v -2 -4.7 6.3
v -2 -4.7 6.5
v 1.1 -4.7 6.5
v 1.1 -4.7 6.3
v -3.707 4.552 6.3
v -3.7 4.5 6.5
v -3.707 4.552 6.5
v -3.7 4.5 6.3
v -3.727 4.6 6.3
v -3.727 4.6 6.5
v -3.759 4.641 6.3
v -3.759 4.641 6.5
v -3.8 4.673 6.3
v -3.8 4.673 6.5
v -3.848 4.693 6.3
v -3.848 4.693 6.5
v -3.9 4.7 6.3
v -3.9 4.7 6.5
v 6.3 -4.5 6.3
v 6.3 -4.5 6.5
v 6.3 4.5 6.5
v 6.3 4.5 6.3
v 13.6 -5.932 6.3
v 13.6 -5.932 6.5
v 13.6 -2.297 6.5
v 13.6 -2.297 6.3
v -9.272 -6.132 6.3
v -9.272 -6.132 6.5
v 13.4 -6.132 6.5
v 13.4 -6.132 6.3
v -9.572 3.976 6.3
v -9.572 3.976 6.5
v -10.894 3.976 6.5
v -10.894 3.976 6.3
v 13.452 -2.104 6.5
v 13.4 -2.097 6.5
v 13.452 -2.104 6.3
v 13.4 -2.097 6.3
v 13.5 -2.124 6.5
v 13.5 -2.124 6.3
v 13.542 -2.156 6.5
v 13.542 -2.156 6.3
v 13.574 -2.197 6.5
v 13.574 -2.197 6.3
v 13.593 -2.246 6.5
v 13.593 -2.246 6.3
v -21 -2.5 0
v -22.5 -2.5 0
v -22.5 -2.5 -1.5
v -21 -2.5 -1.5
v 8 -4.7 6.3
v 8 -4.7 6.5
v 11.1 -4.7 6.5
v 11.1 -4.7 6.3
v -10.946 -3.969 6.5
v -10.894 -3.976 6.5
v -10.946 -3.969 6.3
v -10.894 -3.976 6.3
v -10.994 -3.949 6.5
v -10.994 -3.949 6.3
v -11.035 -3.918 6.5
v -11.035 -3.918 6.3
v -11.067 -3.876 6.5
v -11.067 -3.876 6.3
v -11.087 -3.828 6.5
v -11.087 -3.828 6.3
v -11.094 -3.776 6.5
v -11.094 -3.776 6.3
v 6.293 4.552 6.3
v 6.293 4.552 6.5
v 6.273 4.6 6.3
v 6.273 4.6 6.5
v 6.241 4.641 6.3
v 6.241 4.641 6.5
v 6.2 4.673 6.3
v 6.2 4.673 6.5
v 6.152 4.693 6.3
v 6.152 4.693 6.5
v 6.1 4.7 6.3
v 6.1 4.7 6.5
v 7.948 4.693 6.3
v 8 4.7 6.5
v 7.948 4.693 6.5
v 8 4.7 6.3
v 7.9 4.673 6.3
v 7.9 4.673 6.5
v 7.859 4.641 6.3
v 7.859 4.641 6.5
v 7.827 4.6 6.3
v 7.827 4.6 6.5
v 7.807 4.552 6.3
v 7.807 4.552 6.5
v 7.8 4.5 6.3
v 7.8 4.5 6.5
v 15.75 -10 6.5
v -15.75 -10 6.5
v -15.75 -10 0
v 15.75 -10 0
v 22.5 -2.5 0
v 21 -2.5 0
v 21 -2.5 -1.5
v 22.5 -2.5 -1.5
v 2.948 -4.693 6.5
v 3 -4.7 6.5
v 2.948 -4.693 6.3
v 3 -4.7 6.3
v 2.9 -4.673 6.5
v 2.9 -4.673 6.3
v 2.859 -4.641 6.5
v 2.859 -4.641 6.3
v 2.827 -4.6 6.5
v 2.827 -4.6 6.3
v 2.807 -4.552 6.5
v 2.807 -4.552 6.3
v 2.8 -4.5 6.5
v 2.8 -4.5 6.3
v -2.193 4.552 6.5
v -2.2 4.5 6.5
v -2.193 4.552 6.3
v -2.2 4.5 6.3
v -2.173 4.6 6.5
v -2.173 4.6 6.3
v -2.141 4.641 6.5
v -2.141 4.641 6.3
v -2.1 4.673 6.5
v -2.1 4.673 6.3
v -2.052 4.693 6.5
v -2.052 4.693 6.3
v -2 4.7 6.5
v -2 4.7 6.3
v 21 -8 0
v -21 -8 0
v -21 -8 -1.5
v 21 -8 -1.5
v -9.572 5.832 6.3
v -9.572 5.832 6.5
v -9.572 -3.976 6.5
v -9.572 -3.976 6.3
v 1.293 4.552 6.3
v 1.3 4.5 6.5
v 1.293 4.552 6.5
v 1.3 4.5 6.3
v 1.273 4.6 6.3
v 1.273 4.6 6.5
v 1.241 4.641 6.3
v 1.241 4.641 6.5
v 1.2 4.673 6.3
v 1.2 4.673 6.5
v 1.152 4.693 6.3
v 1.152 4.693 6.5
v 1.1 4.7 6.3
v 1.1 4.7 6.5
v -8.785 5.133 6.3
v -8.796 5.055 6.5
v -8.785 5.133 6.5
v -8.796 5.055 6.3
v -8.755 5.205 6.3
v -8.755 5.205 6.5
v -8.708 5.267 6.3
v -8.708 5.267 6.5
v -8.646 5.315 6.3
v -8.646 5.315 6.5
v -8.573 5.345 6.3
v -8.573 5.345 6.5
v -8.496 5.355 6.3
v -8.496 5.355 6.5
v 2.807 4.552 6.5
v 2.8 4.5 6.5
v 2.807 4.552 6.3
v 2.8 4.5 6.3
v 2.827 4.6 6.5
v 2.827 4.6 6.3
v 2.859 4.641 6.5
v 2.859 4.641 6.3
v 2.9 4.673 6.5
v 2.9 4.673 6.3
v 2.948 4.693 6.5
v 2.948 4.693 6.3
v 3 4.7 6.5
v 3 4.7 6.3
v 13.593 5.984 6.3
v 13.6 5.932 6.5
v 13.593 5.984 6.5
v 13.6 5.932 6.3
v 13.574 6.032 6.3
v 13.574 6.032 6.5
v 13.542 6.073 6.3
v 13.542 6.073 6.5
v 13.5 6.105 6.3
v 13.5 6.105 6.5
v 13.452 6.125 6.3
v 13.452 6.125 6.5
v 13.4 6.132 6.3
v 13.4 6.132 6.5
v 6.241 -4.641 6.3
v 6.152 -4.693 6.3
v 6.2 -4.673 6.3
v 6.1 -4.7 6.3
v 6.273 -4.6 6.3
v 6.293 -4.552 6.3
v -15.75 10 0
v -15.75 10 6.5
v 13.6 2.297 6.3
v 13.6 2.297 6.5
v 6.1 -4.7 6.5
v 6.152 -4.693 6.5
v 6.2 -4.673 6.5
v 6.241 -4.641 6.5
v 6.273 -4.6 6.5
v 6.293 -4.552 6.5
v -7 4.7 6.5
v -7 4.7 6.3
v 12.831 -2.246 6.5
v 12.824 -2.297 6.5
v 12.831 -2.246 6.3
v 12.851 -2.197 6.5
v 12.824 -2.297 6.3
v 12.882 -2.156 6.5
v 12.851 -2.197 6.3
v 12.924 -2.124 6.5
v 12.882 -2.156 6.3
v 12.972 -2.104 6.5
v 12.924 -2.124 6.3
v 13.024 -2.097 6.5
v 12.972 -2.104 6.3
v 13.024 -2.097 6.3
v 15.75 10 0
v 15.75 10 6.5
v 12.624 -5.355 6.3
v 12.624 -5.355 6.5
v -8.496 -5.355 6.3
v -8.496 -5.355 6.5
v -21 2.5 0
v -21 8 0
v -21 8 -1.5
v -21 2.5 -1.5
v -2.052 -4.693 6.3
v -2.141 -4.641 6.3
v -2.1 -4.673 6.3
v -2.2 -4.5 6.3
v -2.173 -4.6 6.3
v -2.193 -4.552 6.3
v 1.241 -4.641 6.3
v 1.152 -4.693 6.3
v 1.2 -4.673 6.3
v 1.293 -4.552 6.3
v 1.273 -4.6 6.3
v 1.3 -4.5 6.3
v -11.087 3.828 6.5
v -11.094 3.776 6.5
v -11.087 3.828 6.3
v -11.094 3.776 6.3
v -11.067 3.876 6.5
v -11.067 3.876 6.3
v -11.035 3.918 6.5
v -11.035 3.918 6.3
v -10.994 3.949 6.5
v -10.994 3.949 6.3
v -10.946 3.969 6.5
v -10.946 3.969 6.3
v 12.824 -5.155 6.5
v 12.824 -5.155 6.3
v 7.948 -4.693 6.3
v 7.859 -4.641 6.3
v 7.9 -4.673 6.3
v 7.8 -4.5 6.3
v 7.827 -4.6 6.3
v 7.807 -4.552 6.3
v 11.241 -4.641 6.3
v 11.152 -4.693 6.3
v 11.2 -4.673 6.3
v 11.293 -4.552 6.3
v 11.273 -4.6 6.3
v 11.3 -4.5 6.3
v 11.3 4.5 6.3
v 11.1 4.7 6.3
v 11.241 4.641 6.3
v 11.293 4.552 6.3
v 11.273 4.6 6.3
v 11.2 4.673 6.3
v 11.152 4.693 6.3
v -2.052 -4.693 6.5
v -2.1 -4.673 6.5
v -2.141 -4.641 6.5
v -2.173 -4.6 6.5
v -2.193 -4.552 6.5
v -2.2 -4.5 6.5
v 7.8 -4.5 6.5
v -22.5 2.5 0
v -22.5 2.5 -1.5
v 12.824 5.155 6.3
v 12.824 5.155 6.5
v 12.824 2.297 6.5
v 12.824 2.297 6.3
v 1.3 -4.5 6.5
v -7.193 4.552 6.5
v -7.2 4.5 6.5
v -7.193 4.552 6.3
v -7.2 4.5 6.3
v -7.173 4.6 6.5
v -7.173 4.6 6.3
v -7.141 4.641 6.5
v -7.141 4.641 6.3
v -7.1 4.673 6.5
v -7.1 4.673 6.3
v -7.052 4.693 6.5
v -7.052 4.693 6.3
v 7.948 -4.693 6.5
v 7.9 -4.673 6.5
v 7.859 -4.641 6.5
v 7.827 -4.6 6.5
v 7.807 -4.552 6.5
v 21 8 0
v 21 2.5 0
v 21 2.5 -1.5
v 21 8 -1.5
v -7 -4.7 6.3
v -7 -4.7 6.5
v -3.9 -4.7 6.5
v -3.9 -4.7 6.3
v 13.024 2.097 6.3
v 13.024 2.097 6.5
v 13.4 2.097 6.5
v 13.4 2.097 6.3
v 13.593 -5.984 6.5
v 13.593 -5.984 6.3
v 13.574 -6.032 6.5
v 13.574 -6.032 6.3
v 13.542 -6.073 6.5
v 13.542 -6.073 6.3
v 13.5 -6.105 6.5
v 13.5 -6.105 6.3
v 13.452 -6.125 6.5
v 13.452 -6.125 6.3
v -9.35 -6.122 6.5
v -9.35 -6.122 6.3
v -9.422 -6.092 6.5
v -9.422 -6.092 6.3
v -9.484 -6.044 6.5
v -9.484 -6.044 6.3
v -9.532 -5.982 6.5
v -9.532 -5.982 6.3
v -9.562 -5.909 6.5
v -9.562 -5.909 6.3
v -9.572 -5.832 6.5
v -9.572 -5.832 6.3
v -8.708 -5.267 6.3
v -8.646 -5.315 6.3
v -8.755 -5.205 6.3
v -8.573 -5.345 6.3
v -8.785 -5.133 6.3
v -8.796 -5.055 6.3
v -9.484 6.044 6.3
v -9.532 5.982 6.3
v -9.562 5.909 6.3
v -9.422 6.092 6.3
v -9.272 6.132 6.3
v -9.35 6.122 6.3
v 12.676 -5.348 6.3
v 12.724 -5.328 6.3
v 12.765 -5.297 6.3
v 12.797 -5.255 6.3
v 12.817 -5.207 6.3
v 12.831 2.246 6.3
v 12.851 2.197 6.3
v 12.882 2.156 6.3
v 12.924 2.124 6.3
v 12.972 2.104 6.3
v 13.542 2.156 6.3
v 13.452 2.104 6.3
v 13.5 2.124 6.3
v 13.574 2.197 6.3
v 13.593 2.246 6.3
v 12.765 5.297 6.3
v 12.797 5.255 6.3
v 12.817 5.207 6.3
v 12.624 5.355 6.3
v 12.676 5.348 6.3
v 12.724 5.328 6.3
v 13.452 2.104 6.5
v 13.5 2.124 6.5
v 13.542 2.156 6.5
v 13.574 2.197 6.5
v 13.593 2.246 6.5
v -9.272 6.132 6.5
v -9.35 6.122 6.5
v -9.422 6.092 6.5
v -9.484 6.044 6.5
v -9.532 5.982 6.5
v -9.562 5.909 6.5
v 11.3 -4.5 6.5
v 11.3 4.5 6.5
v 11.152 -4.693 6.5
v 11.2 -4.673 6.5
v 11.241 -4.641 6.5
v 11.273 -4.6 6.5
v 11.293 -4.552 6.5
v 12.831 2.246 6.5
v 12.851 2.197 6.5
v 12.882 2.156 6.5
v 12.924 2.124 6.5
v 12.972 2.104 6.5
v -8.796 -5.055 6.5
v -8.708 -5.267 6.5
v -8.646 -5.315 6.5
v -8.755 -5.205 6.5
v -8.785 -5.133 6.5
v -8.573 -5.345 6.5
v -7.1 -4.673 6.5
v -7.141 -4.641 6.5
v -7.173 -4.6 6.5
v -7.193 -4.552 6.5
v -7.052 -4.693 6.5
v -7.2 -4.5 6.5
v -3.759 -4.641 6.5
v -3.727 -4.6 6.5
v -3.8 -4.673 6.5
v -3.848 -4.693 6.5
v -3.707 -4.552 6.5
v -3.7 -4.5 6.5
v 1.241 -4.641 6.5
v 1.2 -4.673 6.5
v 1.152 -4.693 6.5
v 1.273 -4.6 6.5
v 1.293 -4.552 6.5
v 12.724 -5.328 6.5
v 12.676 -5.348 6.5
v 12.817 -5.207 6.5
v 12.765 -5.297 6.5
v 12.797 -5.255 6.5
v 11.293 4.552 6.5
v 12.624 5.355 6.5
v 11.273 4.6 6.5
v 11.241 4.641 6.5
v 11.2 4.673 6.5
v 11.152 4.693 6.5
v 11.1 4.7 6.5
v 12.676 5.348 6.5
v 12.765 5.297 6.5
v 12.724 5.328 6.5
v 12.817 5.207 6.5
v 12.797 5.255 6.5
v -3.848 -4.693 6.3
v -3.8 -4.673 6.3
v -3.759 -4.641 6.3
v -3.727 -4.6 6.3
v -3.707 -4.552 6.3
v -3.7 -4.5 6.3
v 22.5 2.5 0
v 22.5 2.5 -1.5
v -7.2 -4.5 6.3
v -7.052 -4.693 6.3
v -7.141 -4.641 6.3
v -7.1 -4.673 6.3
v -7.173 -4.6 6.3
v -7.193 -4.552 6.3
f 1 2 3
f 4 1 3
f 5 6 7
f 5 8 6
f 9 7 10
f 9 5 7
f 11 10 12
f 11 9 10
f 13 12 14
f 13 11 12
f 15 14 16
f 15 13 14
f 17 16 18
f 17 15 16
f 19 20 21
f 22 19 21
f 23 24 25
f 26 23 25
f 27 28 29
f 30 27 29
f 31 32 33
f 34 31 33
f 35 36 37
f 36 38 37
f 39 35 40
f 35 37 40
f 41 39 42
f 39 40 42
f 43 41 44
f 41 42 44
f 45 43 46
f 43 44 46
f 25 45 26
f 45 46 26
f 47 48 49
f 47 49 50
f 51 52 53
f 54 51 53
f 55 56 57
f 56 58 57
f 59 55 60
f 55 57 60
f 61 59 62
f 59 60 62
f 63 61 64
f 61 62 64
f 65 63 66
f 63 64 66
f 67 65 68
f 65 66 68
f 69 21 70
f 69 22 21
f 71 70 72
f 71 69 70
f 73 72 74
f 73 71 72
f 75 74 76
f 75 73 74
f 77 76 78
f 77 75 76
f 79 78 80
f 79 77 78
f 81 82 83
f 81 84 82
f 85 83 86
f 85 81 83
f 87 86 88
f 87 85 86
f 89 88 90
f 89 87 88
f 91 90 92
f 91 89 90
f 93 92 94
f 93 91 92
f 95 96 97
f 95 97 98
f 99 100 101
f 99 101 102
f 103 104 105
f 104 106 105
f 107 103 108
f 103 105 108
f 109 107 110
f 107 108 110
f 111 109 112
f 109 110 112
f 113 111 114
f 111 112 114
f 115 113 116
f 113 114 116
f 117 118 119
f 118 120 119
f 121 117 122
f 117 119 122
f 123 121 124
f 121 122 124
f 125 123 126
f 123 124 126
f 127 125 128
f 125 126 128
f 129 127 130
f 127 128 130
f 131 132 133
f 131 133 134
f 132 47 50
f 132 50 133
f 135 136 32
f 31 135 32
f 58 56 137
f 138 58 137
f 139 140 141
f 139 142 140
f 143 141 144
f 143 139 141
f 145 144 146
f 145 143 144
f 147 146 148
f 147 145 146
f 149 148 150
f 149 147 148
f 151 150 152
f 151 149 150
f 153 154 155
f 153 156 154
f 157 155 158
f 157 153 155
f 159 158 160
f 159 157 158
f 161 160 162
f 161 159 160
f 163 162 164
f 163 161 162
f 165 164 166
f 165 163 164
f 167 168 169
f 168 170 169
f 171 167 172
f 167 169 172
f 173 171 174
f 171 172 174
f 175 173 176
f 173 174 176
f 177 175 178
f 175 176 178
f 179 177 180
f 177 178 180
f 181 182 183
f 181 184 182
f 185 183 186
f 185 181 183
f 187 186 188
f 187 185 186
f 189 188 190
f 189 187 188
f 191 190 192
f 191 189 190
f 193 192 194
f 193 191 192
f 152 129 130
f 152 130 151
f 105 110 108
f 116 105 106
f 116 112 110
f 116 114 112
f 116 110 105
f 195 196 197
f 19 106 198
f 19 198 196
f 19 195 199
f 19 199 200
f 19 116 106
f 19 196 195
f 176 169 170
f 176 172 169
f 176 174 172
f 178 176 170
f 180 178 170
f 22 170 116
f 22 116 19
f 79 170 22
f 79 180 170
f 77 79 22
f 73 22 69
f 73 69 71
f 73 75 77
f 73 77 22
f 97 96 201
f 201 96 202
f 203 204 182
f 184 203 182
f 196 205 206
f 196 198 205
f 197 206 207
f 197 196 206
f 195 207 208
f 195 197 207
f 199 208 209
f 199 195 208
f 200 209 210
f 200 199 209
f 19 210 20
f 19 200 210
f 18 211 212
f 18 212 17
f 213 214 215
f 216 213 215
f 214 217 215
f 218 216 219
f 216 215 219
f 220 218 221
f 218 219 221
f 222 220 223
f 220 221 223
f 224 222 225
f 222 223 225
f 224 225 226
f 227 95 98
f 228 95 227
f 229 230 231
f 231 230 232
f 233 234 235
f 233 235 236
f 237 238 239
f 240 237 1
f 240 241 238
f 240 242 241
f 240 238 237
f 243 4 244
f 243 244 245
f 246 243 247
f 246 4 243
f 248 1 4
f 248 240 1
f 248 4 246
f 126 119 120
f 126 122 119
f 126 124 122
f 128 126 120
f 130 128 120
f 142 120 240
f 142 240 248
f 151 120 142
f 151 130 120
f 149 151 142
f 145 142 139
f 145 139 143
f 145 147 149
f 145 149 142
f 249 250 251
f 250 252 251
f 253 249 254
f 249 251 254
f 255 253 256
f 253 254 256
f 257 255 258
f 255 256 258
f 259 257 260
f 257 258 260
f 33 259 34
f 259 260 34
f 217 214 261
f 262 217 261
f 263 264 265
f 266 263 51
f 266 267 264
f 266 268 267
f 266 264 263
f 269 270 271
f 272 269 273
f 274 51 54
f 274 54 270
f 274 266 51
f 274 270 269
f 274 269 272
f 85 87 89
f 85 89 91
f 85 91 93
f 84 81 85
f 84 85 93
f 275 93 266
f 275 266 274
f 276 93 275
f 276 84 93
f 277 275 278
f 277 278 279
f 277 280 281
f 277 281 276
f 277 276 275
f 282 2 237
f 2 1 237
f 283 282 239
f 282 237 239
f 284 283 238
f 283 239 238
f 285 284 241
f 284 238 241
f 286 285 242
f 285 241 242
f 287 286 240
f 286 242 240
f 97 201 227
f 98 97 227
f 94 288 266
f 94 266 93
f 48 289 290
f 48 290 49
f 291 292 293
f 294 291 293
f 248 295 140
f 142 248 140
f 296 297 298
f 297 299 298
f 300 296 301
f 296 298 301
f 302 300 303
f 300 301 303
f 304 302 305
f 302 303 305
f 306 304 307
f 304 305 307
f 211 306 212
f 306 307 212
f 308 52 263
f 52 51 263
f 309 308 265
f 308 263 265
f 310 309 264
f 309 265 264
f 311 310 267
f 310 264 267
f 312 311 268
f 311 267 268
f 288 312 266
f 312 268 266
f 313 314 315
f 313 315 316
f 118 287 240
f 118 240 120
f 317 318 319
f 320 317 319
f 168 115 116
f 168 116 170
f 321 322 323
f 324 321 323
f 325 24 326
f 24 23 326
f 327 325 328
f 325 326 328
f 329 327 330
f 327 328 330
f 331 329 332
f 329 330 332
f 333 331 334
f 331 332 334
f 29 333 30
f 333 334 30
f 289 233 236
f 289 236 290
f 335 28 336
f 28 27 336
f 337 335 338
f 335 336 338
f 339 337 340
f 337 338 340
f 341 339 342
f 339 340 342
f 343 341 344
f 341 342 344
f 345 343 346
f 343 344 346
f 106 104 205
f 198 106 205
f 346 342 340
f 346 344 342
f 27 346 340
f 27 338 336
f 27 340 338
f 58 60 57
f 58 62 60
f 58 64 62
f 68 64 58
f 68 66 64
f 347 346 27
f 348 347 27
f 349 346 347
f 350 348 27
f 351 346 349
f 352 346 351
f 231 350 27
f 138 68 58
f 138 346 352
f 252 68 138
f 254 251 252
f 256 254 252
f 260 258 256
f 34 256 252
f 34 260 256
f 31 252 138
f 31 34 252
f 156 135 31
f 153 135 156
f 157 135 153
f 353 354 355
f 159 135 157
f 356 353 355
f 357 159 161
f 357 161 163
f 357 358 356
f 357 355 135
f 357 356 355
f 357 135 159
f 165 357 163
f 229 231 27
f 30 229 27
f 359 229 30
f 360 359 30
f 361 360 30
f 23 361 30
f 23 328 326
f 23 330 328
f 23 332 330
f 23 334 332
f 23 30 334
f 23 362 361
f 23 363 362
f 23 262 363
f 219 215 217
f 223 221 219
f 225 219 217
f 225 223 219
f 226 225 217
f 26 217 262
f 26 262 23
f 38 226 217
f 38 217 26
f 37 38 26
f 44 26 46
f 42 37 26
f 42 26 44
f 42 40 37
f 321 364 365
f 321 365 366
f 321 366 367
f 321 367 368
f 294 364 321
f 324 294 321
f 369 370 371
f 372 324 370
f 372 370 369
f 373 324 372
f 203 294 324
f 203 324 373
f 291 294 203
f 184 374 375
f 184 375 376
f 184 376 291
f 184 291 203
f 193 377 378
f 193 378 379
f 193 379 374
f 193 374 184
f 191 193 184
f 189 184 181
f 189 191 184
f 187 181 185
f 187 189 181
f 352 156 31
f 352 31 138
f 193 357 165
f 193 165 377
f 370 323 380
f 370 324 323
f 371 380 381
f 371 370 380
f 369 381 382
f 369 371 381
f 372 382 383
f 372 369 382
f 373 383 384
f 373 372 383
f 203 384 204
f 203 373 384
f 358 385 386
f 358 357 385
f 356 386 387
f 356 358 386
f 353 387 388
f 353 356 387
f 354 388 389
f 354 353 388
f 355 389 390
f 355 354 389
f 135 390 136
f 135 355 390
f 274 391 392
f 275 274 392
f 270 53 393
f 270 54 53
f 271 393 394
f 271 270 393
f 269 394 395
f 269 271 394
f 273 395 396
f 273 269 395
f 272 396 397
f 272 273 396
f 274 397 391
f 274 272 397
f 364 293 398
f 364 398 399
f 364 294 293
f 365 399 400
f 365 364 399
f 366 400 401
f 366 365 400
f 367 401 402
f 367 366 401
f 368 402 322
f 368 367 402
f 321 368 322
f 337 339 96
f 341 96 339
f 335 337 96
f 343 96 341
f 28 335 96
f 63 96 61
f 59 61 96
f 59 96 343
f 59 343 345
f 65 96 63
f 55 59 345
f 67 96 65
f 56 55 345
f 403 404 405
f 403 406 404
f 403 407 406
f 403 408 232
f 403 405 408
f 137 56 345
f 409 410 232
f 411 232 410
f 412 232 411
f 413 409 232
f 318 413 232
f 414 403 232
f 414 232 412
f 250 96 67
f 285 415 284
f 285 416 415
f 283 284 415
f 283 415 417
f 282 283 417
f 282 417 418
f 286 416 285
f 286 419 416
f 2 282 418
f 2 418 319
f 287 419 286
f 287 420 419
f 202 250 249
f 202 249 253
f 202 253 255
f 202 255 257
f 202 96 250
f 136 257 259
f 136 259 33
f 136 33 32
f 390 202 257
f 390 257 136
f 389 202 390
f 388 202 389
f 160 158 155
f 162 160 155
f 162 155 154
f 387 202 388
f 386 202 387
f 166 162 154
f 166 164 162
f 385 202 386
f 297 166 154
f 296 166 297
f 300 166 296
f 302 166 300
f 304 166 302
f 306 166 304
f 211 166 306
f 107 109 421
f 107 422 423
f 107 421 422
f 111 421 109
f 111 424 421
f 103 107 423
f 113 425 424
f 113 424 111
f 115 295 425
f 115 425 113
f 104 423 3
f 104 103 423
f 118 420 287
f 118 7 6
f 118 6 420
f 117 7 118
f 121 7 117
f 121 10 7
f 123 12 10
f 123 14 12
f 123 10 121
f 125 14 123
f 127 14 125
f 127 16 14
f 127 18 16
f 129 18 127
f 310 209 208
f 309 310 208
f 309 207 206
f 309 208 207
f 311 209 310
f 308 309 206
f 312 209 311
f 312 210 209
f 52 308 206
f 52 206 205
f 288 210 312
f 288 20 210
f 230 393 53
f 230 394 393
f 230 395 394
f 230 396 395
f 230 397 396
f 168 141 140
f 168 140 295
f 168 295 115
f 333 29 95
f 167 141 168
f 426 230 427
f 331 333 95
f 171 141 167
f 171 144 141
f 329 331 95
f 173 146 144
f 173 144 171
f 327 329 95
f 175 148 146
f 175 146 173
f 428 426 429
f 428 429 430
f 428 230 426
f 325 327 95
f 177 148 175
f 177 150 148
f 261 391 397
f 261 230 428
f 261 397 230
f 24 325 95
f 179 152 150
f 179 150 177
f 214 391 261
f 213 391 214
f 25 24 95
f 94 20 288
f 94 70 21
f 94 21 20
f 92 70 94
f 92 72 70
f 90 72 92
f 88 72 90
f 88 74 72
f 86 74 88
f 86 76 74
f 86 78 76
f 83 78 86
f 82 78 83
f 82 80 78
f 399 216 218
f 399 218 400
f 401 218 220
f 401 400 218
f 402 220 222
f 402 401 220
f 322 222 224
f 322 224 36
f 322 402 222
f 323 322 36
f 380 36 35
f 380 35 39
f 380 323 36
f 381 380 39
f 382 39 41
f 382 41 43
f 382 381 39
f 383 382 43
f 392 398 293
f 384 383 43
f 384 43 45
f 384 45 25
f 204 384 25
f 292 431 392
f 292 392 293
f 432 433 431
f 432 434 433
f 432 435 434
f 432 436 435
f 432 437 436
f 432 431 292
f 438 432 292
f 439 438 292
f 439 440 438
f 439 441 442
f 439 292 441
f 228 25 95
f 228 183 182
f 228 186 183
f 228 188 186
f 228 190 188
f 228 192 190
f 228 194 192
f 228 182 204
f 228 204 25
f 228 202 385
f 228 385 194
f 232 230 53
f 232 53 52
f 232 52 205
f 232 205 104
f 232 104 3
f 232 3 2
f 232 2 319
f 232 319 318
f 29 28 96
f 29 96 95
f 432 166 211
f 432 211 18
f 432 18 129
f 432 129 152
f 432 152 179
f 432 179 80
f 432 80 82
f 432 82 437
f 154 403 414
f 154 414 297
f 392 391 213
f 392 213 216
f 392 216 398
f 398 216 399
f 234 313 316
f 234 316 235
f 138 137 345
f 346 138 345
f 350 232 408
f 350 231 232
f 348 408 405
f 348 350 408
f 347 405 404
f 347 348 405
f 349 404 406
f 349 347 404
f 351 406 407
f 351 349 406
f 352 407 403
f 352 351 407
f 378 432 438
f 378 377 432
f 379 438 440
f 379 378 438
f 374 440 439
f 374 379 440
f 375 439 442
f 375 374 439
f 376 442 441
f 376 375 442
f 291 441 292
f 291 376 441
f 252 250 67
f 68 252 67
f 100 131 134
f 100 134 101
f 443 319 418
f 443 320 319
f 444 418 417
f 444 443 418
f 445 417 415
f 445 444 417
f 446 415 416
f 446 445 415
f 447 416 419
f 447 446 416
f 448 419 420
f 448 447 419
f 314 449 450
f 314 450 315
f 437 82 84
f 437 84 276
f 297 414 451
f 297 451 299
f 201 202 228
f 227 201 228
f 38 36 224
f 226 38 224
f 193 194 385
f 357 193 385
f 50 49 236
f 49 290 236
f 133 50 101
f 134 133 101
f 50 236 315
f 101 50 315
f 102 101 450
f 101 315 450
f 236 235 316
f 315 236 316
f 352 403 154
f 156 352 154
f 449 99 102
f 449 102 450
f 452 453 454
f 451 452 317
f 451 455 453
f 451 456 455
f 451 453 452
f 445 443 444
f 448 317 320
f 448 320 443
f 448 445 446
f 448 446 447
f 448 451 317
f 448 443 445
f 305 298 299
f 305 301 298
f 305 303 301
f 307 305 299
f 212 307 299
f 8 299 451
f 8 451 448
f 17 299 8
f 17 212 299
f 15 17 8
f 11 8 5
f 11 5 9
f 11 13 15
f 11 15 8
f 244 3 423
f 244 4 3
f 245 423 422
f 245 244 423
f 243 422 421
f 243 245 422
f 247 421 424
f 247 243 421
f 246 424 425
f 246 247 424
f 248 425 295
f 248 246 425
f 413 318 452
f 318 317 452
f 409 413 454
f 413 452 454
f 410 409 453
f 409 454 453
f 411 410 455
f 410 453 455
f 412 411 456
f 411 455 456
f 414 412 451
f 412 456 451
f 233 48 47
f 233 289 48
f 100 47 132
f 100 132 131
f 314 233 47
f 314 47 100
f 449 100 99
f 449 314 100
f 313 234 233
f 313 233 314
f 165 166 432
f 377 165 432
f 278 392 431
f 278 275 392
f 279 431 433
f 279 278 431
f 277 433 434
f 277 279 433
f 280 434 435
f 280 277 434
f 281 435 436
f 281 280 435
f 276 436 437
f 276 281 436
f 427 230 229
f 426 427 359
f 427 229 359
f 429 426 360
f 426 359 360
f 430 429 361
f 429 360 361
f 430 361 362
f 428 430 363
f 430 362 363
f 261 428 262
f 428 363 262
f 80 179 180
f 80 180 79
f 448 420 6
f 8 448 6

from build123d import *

# Parameters (mm, degrees)
BOSS_EXTRUDE2_DEPTH = 1.5
SKETCH12_W          = 31.5
SKETCH12_H          = 20
BOSS_EXTRUDE3_DEPTH = 6.5
CUT_EXTRUDE6_DEPTH  = 0.2
SKETCH18_W          = 3.5
SKETCH18_H          = 9.4
CUT_EXTRUDE7_DEPTH  = 0.2
SKETCH19_W          = 3.5
SKETCH19_H          = 9.4
CUT_EXTRUDE8_DEPTH  = 0.2
SKETCH24_W          = 3.5
SKETCH24_H          = 9.4
CUT_EXTRUDE9_DEPTH  = 0.2
SKETCH25_W          = 3.5
SKETCH25_H          = 9.4
CUT_EXTRUDE10_DEPTH = 0.2
FILLET3_R           = 0.2
FILLET4_R           = 0.3


with BuildPart() as part:
    # Sketch8 → Boss-Extrude2 (new body)
    with BuildSketch(Plane.XY):
        Polygon((-22.5, -2.5), (-21, -2.5), (-21, -8), (21, -8), (21, -2.5), (22.5, -2.5), (22.5, 2.5), (21, 2.5), (21, 8), (-21, 8), (-21, 2.5), (-22.5, 2.5), align=None)
    extrude(amount=-BOSS_EXTRUDE2_DEPTH)


with BuildPart() as body_2:
    # Sketch12 → Boss-Extrude3 (new body)
    with BuildSketch(Plane.XY.offset(6.5)):
        Rectangle(SKETCH12_W, SKETCH12_H)
    extrude(amount=-BOSS_EXTRUDE3_DEPTH)

    # Sketch13 → Cut-Extrude6 (cut)
    with BuildSketch(Plane.XY.offset(6.5)):
        Polygon((12.823799914, -5.355248942), (-8.795680458, -5.355248942), (-8.795680458, 5.355248942), (12.823799914, 5.355248942), (12.823799914, 2.097392841), (13.600304882, 2.097392841), (13.600304882, 6.131753909), (-9.572185425, 6.131753909), (-9.572185425, 3.976145895), (-11.093791082, 3.976145895), (-11.093791082, -3.976145895), (-9.572185425, -3.976145895), (-9.572185425, -6.131753909), (13.600304882, -6.131753909), (13.600304882, -2.097392841), (12.823799914, -2.097392841), align=None)
    extrude(amount=-CUT_EXTRUDE6_DEPTH, mode=Mode.SUBTRACT)

    # Sketch18 → Cut-Extrude7 (cut)
    with BuildSketch(Plane.XY.offset(6.5)):
        with Locations((-0.45, 0)):
            Rectangle(SKETCH18_W, SKETCH18_H)
    extrude(amount=-CUT_EXTRUDE7_DEPTH, mode=Mode.SUBTRACT)

    # Sketch19 → Cut-Extrude8 (cut)
    with BuildSketch(Plane.XY.offset(6.5)):
        with Locations((-5.45, 0)):
            Rectangle(SKETCH19_W, SKETCH19_H)
    extrude(amount=-CUT_EXTRUDE8_DEPTH, mode=Mode.SUBTRACT)

    # Sketch24 → Cut-Extrude9 (cut)
    with BuildSketch(Plane.XY.offset(6.5)):
        with Locations((4.55, 0)):
            Rectangle(SKETCH24_W, SKETCH24_H)
    extrude(amount=-CUT_EXTRUDE9_DEPTH, mode=Mode.SUBTRACT)

    # Sketch25 → Cut-Extrude10 (cut)
    with BuildSketch(Plane.XY.offset(6.5)):
        with Locations((9.55, 0)):
            Rectangle(SKETCH25_W, SKETCH25_H)
    extrude(amount=-CUT_EXTRUDE10_DEPTH, mode=Mode.SUBTRACT)

    # Fillet3
    fillet3_edges = [body_2.edges().sort_by_distance(p)[0] for p in [
        (7.8, -4.7, 6.4),
        (7.8, 4.7, 6.4),
        (11.3, 4.7, 6.4),
        (11.3, -4.7, 6.4),
        (12.823799914, -5.355248942, 6.4),
        (12.823799914, -2.097392841, 6.4),
        (13.600304882, -2.097392841, 6.4),
        (13.600304882, -6.131753909, 6.4),
        (-11.093791082, -3.976145895, 6.4),
        (-11.093791082, 3.976145895, 6.4),
        (13.600304882, 6.131753909, 6.4),
        (13.600304882, 2.097392841, 6.4),
        (12.823799914, 2.097392841, 6.4),
        (12.823799914, 5.355248942, 6.4),
        (-2.2, -4.7, 6.4),
        (-2.2, 4.7, 6.4),
        (1.3, 4.7, 6.4),
        (1.3, -4.7, 6.4),
        (-7.2, -4.7, 6.4),
        (-7.2, 4.7, 6.4),
        (-3.7, 4.7, 6.4),
        (-3.7, -4.7, 6.4),
        (2.8, -4.7, 6.4),
        (2.8, 4.7, 6.4),
        (6.3, 4.7, 6.4),
        (6.3, -4.7, 6.4),
    ]]
    fillet(fillet3_edges, radius=FILLET3_R)

    # Fillet4
    fillet4_edges = [body_2.edges().sort_by_distance(p)[0] for p in [
        (-9.572185425, -6.131753909, 6.4),
        (-9.572185425, 6.131753909, 6.4),
        (-8.795680458, 5.355248942, 6.4),
        (-8.795680458, -5.355248942, 6.4),
    ]]
    fillet(fillet4_edges, radius=FILLET4_R)


solid = Compound([part.part, body_2.part])
